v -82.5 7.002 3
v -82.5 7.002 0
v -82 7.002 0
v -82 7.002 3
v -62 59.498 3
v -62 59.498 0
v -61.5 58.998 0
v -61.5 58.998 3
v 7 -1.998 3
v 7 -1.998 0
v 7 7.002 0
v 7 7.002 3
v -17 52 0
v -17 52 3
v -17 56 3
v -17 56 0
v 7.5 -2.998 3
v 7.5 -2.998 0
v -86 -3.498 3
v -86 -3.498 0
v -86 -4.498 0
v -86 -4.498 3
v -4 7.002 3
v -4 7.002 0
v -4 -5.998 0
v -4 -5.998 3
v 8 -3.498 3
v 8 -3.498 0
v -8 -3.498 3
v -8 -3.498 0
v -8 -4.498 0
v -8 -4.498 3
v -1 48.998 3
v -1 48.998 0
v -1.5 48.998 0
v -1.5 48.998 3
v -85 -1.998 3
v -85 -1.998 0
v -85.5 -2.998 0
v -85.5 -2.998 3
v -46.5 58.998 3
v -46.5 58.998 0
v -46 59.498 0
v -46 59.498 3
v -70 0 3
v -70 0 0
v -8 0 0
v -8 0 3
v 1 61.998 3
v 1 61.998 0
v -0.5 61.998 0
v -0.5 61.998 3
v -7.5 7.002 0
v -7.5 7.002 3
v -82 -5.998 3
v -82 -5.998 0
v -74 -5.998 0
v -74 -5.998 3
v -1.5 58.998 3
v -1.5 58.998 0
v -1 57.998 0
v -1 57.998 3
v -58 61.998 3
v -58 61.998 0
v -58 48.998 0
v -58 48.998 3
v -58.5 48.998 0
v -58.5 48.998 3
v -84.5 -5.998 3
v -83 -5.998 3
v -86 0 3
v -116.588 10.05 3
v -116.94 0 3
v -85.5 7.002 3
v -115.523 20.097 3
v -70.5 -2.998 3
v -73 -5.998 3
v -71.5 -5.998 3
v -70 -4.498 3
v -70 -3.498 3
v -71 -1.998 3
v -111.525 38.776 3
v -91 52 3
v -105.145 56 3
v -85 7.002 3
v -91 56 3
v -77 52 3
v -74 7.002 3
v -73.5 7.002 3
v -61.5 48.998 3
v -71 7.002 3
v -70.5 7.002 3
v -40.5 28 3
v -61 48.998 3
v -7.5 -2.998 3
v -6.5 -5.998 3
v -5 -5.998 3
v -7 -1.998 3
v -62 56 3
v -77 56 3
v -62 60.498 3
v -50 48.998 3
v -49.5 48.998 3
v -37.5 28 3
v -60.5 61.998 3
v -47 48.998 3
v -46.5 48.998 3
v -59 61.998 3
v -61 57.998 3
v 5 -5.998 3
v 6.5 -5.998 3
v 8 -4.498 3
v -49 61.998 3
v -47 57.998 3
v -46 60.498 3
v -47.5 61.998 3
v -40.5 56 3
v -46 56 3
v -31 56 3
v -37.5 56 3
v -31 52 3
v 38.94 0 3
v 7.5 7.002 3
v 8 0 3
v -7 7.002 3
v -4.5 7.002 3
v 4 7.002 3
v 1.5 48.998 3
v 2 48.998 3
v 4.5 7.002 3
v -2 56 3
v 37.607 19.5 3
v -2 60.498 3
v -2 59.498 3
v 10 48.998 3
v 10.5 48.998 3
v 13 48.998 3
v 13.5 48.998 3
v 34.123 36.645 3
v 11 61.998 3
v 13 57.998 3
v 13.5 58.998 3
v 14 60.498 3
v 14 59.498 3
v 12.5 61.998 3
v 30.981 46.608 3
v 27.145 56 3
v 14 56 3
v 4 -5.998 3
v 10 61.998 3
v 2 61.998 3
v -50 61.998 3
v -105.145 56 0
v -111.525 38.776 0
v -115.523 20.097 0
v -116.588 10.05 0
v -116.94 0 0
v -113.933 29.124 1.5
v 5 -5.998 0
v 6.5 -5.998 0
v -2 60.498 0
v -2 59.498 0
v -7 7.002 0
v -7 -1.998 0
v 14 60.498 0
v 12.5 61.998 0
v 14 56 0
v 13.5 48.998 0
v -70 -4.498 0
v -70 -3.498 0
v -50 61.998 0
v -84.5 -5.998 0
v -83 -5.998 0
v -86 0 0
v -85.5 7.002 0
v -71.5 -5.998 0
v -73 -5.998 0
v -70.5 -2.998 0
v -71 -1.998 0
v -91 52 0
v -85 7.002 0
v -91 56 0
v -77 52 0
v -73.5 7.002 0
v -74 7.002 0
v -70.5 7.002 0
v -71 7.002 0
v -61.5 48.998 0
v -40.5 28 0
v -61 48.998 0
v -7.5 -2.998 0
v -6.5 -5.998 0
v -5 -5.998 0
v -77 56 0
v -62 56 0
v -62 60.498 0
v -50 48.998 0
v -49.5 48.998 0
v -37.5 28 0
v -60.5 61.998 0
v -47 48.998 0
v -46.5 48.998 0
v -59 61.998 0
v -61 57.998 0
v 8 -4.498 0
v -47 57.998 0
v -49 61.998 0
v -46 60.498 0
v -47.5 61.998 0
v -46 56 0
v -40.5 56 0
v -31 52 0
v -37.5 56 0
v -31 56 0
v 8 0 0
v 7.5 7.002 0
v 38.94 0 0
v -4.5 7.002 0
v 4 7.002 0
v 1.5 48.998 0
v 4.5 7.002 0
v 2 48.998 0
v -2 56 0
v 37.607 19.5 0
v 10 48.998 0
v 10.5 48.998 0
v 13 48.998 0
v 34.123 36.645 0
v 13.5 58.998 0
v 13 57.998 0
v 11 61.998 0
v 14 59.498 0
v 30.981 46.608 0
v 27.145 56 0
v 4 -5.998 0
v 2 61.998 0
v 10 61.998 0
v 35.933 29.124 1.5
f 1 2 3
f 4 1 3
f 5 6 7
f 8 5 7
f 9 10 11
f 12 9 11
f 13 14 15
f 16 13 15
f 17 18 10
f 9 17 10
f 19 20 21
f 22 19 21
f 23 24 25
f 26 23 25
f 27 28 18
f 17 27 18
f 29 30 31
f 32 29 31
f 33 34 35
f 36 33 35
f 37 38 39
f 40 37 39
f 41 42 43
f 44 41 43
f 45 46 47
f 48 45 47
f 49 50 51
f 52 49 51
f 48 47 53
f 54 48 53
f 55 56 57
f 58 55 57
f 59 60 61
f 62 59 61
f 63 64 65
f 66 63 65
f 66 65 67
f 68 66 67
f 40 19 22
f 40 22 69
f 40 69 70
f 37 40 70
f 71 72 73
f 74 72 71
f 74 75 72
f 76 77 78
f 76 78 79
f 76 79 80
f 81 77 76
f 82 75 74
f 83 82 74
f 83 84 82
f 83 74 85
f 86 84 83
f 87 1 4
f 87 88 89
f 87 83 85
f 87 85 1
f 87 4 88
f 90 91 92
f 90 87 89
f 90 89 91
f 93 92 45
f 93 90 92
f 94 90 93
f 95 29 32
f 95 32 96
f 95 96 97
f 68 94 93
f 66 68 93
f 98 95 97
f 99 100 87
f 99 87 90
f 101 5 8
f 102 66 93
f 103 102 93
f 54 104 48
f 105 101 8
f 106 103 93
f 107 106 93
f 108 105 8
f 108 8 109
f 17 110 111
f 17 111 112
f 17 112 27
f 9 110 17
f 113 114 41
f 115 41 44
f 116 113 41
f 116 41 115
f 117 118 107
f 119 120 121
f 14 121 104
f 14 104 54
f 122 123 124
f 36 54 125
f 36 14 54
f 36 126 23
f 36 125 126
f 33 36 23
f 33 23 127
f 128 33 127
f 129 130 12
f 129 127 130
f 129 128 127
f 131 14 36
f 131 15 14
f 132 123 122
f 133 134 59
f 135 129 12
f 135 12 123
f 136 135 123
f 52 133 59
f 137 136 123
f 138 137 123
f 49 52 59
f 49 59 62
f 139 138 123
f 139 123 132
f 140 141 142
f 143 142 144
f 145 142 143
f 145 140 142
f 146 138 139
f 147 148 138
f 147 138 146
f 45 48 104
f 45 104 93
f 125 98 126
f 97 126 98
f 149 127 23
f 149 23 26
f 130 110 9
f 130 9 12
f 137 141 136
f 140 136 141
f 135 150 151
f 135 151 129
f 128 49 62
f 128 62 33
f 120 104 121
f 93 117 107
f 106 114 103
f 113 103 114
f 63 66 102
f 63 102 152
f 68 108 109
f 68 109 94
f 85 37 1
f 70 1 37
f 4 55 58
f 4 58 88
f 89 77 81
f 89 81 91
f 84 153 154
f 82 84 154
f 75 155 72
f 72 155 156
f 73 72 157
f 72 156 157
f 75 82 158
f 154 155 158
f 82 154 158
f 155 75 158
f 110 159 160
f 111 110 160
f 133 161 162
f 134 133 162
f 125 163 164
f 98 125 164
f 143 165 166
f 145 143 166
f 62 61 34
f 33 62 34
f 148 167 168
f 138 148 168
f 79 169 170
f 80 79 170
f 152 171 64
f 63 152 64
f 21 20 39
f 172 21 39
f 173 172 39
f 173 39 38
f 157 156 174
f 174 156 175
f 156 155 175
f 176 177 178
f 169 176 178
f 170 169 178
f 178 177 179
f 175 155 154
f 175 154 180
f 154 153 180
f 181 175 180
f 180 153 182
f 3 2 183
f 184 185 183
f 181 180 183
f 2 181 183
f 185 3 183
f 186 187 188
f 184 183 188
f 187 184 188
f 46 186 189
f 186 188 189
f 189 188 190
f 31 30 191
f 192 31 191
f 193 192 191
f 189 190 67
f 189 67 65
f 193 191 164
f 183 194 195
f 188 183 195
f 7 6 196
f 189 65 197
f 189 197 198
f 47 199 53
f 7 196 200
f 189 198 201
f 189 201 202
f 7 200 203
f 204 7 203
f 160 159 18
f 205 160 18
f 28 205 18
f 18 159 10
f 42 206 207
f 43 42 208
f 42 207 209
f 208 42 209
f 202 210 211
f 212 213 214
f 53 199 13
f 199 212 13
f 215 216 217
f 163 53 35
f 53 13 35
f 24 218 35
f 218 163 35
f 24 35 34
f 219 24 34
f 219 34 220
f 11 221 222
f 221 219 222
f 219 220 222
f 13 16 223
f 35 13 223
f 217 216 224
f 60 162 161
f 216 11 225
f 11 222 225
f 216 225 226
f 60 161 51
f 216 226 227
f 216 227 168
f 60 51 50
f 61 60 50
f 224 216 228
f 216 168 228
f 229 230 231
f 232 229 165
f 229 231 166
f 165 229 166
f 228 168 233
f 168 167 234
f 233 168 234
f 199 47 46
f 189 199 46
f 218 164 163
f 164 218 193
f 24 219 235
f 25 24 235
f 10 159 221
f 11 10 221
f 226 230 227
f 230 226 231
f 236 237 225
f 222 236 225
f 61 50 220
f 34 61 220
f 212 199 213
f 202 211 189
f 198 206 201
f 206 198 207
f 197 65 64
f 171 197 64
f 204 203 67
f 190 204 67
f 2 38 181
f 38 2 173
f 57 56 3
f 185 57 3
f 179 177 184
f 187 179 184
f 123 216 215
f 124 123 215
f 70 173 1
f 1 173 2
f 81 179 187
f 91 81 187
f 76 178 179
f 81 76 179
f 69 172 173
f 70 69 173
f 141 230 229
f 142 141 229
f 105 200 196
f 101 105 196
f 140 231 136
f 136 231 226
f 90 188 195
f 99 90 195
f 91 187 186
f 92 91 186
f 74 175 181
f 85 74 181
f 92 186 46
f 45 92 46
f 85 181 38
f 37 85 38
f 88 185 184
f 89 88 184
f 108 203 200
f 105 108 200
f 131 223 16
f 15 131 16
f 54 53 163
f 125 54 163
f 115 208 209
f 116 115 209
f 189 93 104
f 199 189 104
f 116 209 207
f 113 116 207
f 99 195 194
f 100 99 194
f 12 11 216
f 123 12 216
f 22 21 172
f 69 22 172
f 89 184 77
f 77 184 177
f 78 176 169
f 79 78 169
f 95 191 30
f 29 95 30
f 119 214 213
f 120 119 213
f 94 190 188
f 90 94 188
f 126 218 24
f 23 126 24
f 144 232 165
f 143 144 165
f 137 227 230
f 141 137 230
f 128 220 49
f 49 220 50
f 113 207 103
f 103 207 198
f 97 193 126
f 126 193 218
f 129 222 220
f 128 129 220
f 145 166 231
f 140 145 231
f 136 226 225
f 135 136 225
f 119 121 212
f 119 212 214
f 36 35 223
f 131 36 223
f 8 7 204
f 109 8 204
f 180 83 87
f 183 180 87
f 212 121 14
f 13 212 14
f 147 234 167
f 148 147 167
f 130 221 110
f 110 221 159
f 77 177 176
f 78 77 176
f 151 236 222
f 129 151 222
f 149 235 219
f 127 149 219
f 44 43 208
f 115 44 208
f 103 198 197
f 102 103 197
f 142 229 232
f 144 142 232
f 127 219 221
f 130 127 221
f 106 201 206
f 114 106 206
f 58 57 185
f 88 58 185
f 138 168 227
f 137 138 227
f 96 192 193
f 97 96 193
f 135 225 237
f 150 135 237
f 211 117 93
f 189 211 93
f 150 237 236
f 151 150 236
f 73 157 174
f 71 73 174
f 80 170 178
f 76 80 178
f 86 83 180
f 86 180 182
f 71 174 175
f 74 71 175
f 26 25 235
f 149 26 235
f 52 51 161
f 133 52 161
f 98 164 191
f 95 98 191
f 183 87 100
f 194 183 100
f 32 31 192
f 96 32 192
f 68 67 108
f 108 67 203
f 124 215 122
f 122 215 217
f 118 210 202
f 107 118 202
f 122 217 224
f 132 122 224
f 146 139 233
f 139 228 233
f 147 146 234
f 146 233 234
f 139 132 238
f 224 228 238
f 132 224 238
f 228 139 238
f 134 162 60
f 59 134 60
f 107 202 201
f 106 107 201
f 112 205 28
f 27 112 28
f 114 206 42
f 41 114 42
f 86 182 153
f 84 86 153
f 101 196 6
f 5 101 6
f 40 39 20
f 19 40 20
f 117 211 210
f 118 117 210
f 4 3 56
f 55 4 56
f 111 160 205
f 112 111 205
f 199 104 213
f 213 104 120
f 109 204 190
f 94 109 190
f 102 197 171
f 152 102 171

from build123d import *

# Parameters (mm, degrees)
BOSS_EXTRUDE1_DEPTH     = 3
SKETCH9_W               = 14
SKETCH9_H               = 4
CUT_EXTRUDE3_DEPTH      = 4.0000001
CUT_EXTRUDE4_DEPTH      = 1.0000001
CUT_EXTRUDE4_DEPTH_BACK = 3


with BuildPart() as part:
    # Sketch1 → Boss-Extrude1 (new body)
    with BuildSketch(Plane.XY):
        with BuildLine():
            Line((-39, 0), (-8, 0))
            Line((-8, 0), (-7.5, 7.002171092))
            Line((-7.5, 7.002171092), (-7, 7.002171092))
            Line((-7, 7.002171092), (-7, -1.997828908))
            Line((-7, -1.997828908), (-7.5, -2.997828908))
            Line((-7.5, -2.997828908), (-8, -3.497828908))
            Line((-8, -3.497828908), (-8, -4.497828908))
            Line((-8, -4.497828908), (-6.5, -5.997828908))
            Line((-6.5, -5.997828908), (-5, -5.997828908))
            Line((-5, -5.997828908), (-4.5, 7.002171092))
            Line((-4.5, 7.002171092), (-4, 7.002171092))
            Line((-4, 7.002171092), (-4, -5.997828908))
            Line((-4, -5.997828908), (4, -5.997828908))
            Line((4, -5.997828908), (4, 7.002171092))
            Line((4, 7.002171092), (4.5, 7.002171092))
            Line((4.5, 7.002171092), (5, -5.997828908))
            Line((5, -5.997828908), (6.5, -5.997828908))
            Line((6.5, -5.997828908), (8, -4.497828908))
            Line((8, -4.497828908), (8, -3.497828908))
            Line((8, -3.497828908), (7.5, -2.997828908))
            Line((7.5, -2.997828908), (7, -1.997828908))
            Line((7, -1.997828908), (7, 7.002171092))
            Line((7, 7.002171092), (7.5, 7.002171092))
            Line((7.5, 7.002171092), (8, 0))
            Line((8, 0), (38.94, 0))
            add(Edge.make_bspline(
                [(38.94, 0), (38.94, 30.292119235), (27.145, 56)],
                knots=[1.570796327, 1.570796327, 1.570796327, 2.128135243, 2.128135243, 2.128135243], degree=2, weights=[1, 0.96142229, 1]))
            Line((27.145, 56), (14, 56))
            Line((14, 56), (13.5, 48.997828908))
            Line((13.5, 48.997828908), (13, 48.997828908))
            Line((13, 48.997828908), (13, 57.997828908))
            Line((13, 57.997828908), (13.5, 58.997828908))
            Line((13.5, 58.997828908), (14, 59.497828908))
            Line((14, 59.497828908), (14, 60.497828908))
            Line((14, 60.497828908), (12.5, 61.997828908))
            Line((12.5, 61.997828908), (11, 61.997828908))
            Line((11, 61.997828908), (10.5, 48.997828908))
            Line((10.5, 48.997828908), (10, 48.997828908))
            Line((10, 48.997828908), (10, 61.997828908))
            Line((10, 61.997828908), (2, 61.997828908))
            Line((2, 61.997828908), (2, 48.997828908))
            Line((2, 48.997828908), (1.5, 48.997828908))
            Line((1.5, 48.997828908), (1, 61.997828908))
            Line((1, 61.997828908), (-0.5, 61.997828908))
            Line((-0.5, 61.997828908), (-2, 60.497828908))
            Line((-2, 60.497828908), (-2, 59.497828908))
            Line((-2, 59.497828908), (-1.5, 58.997828908))
            Line((-1.5, 58.997828908), (-1, 57.997828908))
            Line((-1, 57.997828908), (-1, 48.997828908))
            Line((-1, 48.997828908), (-1.5, 48.997828908))
            Line((-1.5, 48.997828908), (-2, 56))
            Line((-2, 56), (-46, 56))
            Line((-46, 56), (-46.5, 48.997828908))
            Line((-46.5, 48.997828908), (-47, 48.997828908))
            Line((-47, 48.997828908), (-47, 57.997828908))
            Line((-47, 57.997828908), (-46.5, 58.997828908))
            Line((-46.5, 58.997828908), (-46, 59.497828908))
            Line((-46, 59.497828908), (-46, 60.497828908))
            Line((-46, 60.497828908), (-47.5, 61.997828908))
            Line((-47.5, 61.997828908), (-49, 61.997828908))
            Line((-49, 61.997828908), (-49.5, 48.997828908))
            Line((-49.5, 48.997828908), (-50, 48.997828908))
            Line((-50, 48.997828908), (-50, 61.997828908))
            Line((-50, 61.997828908), (-58, 61.997828908))
            Line((-58, 61.997828908), (-58, 48.997828908))
            Line((-58, 48.997828908), (-58.5, 48.997828908))
            Line((-58.5, 48.997828908), (-59, 61.997828908))
            Line((-59, 61.997828908), (-60.5, 61.997828908))
            Line((-60.5, 61.997828908), (-62, 60.497828908))
            Line((-62, 60.497828908), (-62, 59.497828908))
            Line((-62, 59.497828908), (-61.5, 58.997828908))
            Line((-61.5, 58.997828908), (-61, 57.997828908))
            Line((-61, 57.997828908), (-61, 48.997828908))
            Line((-61, 48.997828908), (-61.5, 48.997828908))
            Line((-61.5, 48.997828908), (-62, 56))
            Line((-62, 56), (-105.145, 56))
            add(Edge.make_bspline(
                [(-105.145, 56), (-116.94, 30.292119235), (-116.94, 0)],
                knots=[4.155050064, 4.155050064, 4.155050064, 4.71238898, 4.71238898, 4.71238898], degree=2, weights=[1, 0.96142229, 1]))
            Line((-116.94, 0), (-86, 0))
            Line((-86, 0), (-85.5, 7.002171092))
            Line((-85.5, 7.002171092), (-85, 7.002171092))
            Line((-85, 7.002171092), (-85, -1.997828908))
            Line((-85, -1.997828908), (-85.5, -2.997828908))
            Line((-85.5, -2.997828908), (-86, -3.497828908))
            Line((-86, -3.497828908), (-86, -4.497828908))
            Line((-86, -4.497828908), (-84.5, -5.997828908))
            Line((-84.5, -5.997828908), (-83, -5.997828908))
            Line((-83, -5.997828908), (-82.5, 7.002171092))
            Line((-82.5, 7.002171092), (-82, 7.002171092))
            Line((-82, 7.002171092), (-82, -5.997828908))
            Line((-82, -5.997828908), (-74, -5.997828908))
            Line((-74, -5.997828908), (-74, 7.002171092))
            Line((-74, 7.002171092), (-73.5, 7.002171092))
            Line((-73.5, 7.002171092), (-73, -5.997828908))
            Line((-73, -5.997828908), (-71.5, -5.997828908))
            Line((-71.5, -5.997828908), (-70, -4.497828908))
            Line((-70, -4.497828908), (-70, -3.497828908))
            Line((-70, -3.497828908), (-70.5, -2.997828908))
            Line((-70.5, -2.997828908), (-71, -1.997828908))
            Line((-71, -1.997828908), (-71, 7.002171092))
            Line((-71, 7.002171092), (-70.5, 7.002171092))
            Line((-70.5, 7.002171092), (-70, 0))
            Line((-70, 0), (-39, 0))
        make_face()
    extrude(amount=BOSS_EXTRUDE1_DEPTH)

    # Sketch9 → Cut-Extrude3 (cut, through all)
    with BuildSketch(Plane.XY.offset(3)):
        with Locations((-24, 54)):
            Rectangle(SKETCH9_W, SKETCH9_H)
        with Locations((-84, 54)):
            Rectangle(SKETCH9_W, SKETCH9_H)
    extrude(amount=-CUT_EXTRUDE3_DEPTH, mode=Mode.SUBTRACT)

    # Sketch11 → Cut-Extrude4 (cut, two sides)
    with BuildSketch(Plane.XY.offset(3)) as cut_extrude4_sk:
        Polygon((-40.5, 267.538526516), (-40.5, 56), (-40.5, 28), (-37.5, 28), (-37.5, 56), (-37.5, 267.538526516), (-37.5, 690.615579549), (-40.5, 690.615579549), align=None)
    extrude(amount=CUT_EXTRUDE4_DEPTH, mode=Mode.SUBTRACT)
    extrude(cut_extrude4_sk.sketch, amount=-CUT_EXTRUDE4_DEPTH_BACK, mode=Mode.SUBTRACT)


solid = part.part
